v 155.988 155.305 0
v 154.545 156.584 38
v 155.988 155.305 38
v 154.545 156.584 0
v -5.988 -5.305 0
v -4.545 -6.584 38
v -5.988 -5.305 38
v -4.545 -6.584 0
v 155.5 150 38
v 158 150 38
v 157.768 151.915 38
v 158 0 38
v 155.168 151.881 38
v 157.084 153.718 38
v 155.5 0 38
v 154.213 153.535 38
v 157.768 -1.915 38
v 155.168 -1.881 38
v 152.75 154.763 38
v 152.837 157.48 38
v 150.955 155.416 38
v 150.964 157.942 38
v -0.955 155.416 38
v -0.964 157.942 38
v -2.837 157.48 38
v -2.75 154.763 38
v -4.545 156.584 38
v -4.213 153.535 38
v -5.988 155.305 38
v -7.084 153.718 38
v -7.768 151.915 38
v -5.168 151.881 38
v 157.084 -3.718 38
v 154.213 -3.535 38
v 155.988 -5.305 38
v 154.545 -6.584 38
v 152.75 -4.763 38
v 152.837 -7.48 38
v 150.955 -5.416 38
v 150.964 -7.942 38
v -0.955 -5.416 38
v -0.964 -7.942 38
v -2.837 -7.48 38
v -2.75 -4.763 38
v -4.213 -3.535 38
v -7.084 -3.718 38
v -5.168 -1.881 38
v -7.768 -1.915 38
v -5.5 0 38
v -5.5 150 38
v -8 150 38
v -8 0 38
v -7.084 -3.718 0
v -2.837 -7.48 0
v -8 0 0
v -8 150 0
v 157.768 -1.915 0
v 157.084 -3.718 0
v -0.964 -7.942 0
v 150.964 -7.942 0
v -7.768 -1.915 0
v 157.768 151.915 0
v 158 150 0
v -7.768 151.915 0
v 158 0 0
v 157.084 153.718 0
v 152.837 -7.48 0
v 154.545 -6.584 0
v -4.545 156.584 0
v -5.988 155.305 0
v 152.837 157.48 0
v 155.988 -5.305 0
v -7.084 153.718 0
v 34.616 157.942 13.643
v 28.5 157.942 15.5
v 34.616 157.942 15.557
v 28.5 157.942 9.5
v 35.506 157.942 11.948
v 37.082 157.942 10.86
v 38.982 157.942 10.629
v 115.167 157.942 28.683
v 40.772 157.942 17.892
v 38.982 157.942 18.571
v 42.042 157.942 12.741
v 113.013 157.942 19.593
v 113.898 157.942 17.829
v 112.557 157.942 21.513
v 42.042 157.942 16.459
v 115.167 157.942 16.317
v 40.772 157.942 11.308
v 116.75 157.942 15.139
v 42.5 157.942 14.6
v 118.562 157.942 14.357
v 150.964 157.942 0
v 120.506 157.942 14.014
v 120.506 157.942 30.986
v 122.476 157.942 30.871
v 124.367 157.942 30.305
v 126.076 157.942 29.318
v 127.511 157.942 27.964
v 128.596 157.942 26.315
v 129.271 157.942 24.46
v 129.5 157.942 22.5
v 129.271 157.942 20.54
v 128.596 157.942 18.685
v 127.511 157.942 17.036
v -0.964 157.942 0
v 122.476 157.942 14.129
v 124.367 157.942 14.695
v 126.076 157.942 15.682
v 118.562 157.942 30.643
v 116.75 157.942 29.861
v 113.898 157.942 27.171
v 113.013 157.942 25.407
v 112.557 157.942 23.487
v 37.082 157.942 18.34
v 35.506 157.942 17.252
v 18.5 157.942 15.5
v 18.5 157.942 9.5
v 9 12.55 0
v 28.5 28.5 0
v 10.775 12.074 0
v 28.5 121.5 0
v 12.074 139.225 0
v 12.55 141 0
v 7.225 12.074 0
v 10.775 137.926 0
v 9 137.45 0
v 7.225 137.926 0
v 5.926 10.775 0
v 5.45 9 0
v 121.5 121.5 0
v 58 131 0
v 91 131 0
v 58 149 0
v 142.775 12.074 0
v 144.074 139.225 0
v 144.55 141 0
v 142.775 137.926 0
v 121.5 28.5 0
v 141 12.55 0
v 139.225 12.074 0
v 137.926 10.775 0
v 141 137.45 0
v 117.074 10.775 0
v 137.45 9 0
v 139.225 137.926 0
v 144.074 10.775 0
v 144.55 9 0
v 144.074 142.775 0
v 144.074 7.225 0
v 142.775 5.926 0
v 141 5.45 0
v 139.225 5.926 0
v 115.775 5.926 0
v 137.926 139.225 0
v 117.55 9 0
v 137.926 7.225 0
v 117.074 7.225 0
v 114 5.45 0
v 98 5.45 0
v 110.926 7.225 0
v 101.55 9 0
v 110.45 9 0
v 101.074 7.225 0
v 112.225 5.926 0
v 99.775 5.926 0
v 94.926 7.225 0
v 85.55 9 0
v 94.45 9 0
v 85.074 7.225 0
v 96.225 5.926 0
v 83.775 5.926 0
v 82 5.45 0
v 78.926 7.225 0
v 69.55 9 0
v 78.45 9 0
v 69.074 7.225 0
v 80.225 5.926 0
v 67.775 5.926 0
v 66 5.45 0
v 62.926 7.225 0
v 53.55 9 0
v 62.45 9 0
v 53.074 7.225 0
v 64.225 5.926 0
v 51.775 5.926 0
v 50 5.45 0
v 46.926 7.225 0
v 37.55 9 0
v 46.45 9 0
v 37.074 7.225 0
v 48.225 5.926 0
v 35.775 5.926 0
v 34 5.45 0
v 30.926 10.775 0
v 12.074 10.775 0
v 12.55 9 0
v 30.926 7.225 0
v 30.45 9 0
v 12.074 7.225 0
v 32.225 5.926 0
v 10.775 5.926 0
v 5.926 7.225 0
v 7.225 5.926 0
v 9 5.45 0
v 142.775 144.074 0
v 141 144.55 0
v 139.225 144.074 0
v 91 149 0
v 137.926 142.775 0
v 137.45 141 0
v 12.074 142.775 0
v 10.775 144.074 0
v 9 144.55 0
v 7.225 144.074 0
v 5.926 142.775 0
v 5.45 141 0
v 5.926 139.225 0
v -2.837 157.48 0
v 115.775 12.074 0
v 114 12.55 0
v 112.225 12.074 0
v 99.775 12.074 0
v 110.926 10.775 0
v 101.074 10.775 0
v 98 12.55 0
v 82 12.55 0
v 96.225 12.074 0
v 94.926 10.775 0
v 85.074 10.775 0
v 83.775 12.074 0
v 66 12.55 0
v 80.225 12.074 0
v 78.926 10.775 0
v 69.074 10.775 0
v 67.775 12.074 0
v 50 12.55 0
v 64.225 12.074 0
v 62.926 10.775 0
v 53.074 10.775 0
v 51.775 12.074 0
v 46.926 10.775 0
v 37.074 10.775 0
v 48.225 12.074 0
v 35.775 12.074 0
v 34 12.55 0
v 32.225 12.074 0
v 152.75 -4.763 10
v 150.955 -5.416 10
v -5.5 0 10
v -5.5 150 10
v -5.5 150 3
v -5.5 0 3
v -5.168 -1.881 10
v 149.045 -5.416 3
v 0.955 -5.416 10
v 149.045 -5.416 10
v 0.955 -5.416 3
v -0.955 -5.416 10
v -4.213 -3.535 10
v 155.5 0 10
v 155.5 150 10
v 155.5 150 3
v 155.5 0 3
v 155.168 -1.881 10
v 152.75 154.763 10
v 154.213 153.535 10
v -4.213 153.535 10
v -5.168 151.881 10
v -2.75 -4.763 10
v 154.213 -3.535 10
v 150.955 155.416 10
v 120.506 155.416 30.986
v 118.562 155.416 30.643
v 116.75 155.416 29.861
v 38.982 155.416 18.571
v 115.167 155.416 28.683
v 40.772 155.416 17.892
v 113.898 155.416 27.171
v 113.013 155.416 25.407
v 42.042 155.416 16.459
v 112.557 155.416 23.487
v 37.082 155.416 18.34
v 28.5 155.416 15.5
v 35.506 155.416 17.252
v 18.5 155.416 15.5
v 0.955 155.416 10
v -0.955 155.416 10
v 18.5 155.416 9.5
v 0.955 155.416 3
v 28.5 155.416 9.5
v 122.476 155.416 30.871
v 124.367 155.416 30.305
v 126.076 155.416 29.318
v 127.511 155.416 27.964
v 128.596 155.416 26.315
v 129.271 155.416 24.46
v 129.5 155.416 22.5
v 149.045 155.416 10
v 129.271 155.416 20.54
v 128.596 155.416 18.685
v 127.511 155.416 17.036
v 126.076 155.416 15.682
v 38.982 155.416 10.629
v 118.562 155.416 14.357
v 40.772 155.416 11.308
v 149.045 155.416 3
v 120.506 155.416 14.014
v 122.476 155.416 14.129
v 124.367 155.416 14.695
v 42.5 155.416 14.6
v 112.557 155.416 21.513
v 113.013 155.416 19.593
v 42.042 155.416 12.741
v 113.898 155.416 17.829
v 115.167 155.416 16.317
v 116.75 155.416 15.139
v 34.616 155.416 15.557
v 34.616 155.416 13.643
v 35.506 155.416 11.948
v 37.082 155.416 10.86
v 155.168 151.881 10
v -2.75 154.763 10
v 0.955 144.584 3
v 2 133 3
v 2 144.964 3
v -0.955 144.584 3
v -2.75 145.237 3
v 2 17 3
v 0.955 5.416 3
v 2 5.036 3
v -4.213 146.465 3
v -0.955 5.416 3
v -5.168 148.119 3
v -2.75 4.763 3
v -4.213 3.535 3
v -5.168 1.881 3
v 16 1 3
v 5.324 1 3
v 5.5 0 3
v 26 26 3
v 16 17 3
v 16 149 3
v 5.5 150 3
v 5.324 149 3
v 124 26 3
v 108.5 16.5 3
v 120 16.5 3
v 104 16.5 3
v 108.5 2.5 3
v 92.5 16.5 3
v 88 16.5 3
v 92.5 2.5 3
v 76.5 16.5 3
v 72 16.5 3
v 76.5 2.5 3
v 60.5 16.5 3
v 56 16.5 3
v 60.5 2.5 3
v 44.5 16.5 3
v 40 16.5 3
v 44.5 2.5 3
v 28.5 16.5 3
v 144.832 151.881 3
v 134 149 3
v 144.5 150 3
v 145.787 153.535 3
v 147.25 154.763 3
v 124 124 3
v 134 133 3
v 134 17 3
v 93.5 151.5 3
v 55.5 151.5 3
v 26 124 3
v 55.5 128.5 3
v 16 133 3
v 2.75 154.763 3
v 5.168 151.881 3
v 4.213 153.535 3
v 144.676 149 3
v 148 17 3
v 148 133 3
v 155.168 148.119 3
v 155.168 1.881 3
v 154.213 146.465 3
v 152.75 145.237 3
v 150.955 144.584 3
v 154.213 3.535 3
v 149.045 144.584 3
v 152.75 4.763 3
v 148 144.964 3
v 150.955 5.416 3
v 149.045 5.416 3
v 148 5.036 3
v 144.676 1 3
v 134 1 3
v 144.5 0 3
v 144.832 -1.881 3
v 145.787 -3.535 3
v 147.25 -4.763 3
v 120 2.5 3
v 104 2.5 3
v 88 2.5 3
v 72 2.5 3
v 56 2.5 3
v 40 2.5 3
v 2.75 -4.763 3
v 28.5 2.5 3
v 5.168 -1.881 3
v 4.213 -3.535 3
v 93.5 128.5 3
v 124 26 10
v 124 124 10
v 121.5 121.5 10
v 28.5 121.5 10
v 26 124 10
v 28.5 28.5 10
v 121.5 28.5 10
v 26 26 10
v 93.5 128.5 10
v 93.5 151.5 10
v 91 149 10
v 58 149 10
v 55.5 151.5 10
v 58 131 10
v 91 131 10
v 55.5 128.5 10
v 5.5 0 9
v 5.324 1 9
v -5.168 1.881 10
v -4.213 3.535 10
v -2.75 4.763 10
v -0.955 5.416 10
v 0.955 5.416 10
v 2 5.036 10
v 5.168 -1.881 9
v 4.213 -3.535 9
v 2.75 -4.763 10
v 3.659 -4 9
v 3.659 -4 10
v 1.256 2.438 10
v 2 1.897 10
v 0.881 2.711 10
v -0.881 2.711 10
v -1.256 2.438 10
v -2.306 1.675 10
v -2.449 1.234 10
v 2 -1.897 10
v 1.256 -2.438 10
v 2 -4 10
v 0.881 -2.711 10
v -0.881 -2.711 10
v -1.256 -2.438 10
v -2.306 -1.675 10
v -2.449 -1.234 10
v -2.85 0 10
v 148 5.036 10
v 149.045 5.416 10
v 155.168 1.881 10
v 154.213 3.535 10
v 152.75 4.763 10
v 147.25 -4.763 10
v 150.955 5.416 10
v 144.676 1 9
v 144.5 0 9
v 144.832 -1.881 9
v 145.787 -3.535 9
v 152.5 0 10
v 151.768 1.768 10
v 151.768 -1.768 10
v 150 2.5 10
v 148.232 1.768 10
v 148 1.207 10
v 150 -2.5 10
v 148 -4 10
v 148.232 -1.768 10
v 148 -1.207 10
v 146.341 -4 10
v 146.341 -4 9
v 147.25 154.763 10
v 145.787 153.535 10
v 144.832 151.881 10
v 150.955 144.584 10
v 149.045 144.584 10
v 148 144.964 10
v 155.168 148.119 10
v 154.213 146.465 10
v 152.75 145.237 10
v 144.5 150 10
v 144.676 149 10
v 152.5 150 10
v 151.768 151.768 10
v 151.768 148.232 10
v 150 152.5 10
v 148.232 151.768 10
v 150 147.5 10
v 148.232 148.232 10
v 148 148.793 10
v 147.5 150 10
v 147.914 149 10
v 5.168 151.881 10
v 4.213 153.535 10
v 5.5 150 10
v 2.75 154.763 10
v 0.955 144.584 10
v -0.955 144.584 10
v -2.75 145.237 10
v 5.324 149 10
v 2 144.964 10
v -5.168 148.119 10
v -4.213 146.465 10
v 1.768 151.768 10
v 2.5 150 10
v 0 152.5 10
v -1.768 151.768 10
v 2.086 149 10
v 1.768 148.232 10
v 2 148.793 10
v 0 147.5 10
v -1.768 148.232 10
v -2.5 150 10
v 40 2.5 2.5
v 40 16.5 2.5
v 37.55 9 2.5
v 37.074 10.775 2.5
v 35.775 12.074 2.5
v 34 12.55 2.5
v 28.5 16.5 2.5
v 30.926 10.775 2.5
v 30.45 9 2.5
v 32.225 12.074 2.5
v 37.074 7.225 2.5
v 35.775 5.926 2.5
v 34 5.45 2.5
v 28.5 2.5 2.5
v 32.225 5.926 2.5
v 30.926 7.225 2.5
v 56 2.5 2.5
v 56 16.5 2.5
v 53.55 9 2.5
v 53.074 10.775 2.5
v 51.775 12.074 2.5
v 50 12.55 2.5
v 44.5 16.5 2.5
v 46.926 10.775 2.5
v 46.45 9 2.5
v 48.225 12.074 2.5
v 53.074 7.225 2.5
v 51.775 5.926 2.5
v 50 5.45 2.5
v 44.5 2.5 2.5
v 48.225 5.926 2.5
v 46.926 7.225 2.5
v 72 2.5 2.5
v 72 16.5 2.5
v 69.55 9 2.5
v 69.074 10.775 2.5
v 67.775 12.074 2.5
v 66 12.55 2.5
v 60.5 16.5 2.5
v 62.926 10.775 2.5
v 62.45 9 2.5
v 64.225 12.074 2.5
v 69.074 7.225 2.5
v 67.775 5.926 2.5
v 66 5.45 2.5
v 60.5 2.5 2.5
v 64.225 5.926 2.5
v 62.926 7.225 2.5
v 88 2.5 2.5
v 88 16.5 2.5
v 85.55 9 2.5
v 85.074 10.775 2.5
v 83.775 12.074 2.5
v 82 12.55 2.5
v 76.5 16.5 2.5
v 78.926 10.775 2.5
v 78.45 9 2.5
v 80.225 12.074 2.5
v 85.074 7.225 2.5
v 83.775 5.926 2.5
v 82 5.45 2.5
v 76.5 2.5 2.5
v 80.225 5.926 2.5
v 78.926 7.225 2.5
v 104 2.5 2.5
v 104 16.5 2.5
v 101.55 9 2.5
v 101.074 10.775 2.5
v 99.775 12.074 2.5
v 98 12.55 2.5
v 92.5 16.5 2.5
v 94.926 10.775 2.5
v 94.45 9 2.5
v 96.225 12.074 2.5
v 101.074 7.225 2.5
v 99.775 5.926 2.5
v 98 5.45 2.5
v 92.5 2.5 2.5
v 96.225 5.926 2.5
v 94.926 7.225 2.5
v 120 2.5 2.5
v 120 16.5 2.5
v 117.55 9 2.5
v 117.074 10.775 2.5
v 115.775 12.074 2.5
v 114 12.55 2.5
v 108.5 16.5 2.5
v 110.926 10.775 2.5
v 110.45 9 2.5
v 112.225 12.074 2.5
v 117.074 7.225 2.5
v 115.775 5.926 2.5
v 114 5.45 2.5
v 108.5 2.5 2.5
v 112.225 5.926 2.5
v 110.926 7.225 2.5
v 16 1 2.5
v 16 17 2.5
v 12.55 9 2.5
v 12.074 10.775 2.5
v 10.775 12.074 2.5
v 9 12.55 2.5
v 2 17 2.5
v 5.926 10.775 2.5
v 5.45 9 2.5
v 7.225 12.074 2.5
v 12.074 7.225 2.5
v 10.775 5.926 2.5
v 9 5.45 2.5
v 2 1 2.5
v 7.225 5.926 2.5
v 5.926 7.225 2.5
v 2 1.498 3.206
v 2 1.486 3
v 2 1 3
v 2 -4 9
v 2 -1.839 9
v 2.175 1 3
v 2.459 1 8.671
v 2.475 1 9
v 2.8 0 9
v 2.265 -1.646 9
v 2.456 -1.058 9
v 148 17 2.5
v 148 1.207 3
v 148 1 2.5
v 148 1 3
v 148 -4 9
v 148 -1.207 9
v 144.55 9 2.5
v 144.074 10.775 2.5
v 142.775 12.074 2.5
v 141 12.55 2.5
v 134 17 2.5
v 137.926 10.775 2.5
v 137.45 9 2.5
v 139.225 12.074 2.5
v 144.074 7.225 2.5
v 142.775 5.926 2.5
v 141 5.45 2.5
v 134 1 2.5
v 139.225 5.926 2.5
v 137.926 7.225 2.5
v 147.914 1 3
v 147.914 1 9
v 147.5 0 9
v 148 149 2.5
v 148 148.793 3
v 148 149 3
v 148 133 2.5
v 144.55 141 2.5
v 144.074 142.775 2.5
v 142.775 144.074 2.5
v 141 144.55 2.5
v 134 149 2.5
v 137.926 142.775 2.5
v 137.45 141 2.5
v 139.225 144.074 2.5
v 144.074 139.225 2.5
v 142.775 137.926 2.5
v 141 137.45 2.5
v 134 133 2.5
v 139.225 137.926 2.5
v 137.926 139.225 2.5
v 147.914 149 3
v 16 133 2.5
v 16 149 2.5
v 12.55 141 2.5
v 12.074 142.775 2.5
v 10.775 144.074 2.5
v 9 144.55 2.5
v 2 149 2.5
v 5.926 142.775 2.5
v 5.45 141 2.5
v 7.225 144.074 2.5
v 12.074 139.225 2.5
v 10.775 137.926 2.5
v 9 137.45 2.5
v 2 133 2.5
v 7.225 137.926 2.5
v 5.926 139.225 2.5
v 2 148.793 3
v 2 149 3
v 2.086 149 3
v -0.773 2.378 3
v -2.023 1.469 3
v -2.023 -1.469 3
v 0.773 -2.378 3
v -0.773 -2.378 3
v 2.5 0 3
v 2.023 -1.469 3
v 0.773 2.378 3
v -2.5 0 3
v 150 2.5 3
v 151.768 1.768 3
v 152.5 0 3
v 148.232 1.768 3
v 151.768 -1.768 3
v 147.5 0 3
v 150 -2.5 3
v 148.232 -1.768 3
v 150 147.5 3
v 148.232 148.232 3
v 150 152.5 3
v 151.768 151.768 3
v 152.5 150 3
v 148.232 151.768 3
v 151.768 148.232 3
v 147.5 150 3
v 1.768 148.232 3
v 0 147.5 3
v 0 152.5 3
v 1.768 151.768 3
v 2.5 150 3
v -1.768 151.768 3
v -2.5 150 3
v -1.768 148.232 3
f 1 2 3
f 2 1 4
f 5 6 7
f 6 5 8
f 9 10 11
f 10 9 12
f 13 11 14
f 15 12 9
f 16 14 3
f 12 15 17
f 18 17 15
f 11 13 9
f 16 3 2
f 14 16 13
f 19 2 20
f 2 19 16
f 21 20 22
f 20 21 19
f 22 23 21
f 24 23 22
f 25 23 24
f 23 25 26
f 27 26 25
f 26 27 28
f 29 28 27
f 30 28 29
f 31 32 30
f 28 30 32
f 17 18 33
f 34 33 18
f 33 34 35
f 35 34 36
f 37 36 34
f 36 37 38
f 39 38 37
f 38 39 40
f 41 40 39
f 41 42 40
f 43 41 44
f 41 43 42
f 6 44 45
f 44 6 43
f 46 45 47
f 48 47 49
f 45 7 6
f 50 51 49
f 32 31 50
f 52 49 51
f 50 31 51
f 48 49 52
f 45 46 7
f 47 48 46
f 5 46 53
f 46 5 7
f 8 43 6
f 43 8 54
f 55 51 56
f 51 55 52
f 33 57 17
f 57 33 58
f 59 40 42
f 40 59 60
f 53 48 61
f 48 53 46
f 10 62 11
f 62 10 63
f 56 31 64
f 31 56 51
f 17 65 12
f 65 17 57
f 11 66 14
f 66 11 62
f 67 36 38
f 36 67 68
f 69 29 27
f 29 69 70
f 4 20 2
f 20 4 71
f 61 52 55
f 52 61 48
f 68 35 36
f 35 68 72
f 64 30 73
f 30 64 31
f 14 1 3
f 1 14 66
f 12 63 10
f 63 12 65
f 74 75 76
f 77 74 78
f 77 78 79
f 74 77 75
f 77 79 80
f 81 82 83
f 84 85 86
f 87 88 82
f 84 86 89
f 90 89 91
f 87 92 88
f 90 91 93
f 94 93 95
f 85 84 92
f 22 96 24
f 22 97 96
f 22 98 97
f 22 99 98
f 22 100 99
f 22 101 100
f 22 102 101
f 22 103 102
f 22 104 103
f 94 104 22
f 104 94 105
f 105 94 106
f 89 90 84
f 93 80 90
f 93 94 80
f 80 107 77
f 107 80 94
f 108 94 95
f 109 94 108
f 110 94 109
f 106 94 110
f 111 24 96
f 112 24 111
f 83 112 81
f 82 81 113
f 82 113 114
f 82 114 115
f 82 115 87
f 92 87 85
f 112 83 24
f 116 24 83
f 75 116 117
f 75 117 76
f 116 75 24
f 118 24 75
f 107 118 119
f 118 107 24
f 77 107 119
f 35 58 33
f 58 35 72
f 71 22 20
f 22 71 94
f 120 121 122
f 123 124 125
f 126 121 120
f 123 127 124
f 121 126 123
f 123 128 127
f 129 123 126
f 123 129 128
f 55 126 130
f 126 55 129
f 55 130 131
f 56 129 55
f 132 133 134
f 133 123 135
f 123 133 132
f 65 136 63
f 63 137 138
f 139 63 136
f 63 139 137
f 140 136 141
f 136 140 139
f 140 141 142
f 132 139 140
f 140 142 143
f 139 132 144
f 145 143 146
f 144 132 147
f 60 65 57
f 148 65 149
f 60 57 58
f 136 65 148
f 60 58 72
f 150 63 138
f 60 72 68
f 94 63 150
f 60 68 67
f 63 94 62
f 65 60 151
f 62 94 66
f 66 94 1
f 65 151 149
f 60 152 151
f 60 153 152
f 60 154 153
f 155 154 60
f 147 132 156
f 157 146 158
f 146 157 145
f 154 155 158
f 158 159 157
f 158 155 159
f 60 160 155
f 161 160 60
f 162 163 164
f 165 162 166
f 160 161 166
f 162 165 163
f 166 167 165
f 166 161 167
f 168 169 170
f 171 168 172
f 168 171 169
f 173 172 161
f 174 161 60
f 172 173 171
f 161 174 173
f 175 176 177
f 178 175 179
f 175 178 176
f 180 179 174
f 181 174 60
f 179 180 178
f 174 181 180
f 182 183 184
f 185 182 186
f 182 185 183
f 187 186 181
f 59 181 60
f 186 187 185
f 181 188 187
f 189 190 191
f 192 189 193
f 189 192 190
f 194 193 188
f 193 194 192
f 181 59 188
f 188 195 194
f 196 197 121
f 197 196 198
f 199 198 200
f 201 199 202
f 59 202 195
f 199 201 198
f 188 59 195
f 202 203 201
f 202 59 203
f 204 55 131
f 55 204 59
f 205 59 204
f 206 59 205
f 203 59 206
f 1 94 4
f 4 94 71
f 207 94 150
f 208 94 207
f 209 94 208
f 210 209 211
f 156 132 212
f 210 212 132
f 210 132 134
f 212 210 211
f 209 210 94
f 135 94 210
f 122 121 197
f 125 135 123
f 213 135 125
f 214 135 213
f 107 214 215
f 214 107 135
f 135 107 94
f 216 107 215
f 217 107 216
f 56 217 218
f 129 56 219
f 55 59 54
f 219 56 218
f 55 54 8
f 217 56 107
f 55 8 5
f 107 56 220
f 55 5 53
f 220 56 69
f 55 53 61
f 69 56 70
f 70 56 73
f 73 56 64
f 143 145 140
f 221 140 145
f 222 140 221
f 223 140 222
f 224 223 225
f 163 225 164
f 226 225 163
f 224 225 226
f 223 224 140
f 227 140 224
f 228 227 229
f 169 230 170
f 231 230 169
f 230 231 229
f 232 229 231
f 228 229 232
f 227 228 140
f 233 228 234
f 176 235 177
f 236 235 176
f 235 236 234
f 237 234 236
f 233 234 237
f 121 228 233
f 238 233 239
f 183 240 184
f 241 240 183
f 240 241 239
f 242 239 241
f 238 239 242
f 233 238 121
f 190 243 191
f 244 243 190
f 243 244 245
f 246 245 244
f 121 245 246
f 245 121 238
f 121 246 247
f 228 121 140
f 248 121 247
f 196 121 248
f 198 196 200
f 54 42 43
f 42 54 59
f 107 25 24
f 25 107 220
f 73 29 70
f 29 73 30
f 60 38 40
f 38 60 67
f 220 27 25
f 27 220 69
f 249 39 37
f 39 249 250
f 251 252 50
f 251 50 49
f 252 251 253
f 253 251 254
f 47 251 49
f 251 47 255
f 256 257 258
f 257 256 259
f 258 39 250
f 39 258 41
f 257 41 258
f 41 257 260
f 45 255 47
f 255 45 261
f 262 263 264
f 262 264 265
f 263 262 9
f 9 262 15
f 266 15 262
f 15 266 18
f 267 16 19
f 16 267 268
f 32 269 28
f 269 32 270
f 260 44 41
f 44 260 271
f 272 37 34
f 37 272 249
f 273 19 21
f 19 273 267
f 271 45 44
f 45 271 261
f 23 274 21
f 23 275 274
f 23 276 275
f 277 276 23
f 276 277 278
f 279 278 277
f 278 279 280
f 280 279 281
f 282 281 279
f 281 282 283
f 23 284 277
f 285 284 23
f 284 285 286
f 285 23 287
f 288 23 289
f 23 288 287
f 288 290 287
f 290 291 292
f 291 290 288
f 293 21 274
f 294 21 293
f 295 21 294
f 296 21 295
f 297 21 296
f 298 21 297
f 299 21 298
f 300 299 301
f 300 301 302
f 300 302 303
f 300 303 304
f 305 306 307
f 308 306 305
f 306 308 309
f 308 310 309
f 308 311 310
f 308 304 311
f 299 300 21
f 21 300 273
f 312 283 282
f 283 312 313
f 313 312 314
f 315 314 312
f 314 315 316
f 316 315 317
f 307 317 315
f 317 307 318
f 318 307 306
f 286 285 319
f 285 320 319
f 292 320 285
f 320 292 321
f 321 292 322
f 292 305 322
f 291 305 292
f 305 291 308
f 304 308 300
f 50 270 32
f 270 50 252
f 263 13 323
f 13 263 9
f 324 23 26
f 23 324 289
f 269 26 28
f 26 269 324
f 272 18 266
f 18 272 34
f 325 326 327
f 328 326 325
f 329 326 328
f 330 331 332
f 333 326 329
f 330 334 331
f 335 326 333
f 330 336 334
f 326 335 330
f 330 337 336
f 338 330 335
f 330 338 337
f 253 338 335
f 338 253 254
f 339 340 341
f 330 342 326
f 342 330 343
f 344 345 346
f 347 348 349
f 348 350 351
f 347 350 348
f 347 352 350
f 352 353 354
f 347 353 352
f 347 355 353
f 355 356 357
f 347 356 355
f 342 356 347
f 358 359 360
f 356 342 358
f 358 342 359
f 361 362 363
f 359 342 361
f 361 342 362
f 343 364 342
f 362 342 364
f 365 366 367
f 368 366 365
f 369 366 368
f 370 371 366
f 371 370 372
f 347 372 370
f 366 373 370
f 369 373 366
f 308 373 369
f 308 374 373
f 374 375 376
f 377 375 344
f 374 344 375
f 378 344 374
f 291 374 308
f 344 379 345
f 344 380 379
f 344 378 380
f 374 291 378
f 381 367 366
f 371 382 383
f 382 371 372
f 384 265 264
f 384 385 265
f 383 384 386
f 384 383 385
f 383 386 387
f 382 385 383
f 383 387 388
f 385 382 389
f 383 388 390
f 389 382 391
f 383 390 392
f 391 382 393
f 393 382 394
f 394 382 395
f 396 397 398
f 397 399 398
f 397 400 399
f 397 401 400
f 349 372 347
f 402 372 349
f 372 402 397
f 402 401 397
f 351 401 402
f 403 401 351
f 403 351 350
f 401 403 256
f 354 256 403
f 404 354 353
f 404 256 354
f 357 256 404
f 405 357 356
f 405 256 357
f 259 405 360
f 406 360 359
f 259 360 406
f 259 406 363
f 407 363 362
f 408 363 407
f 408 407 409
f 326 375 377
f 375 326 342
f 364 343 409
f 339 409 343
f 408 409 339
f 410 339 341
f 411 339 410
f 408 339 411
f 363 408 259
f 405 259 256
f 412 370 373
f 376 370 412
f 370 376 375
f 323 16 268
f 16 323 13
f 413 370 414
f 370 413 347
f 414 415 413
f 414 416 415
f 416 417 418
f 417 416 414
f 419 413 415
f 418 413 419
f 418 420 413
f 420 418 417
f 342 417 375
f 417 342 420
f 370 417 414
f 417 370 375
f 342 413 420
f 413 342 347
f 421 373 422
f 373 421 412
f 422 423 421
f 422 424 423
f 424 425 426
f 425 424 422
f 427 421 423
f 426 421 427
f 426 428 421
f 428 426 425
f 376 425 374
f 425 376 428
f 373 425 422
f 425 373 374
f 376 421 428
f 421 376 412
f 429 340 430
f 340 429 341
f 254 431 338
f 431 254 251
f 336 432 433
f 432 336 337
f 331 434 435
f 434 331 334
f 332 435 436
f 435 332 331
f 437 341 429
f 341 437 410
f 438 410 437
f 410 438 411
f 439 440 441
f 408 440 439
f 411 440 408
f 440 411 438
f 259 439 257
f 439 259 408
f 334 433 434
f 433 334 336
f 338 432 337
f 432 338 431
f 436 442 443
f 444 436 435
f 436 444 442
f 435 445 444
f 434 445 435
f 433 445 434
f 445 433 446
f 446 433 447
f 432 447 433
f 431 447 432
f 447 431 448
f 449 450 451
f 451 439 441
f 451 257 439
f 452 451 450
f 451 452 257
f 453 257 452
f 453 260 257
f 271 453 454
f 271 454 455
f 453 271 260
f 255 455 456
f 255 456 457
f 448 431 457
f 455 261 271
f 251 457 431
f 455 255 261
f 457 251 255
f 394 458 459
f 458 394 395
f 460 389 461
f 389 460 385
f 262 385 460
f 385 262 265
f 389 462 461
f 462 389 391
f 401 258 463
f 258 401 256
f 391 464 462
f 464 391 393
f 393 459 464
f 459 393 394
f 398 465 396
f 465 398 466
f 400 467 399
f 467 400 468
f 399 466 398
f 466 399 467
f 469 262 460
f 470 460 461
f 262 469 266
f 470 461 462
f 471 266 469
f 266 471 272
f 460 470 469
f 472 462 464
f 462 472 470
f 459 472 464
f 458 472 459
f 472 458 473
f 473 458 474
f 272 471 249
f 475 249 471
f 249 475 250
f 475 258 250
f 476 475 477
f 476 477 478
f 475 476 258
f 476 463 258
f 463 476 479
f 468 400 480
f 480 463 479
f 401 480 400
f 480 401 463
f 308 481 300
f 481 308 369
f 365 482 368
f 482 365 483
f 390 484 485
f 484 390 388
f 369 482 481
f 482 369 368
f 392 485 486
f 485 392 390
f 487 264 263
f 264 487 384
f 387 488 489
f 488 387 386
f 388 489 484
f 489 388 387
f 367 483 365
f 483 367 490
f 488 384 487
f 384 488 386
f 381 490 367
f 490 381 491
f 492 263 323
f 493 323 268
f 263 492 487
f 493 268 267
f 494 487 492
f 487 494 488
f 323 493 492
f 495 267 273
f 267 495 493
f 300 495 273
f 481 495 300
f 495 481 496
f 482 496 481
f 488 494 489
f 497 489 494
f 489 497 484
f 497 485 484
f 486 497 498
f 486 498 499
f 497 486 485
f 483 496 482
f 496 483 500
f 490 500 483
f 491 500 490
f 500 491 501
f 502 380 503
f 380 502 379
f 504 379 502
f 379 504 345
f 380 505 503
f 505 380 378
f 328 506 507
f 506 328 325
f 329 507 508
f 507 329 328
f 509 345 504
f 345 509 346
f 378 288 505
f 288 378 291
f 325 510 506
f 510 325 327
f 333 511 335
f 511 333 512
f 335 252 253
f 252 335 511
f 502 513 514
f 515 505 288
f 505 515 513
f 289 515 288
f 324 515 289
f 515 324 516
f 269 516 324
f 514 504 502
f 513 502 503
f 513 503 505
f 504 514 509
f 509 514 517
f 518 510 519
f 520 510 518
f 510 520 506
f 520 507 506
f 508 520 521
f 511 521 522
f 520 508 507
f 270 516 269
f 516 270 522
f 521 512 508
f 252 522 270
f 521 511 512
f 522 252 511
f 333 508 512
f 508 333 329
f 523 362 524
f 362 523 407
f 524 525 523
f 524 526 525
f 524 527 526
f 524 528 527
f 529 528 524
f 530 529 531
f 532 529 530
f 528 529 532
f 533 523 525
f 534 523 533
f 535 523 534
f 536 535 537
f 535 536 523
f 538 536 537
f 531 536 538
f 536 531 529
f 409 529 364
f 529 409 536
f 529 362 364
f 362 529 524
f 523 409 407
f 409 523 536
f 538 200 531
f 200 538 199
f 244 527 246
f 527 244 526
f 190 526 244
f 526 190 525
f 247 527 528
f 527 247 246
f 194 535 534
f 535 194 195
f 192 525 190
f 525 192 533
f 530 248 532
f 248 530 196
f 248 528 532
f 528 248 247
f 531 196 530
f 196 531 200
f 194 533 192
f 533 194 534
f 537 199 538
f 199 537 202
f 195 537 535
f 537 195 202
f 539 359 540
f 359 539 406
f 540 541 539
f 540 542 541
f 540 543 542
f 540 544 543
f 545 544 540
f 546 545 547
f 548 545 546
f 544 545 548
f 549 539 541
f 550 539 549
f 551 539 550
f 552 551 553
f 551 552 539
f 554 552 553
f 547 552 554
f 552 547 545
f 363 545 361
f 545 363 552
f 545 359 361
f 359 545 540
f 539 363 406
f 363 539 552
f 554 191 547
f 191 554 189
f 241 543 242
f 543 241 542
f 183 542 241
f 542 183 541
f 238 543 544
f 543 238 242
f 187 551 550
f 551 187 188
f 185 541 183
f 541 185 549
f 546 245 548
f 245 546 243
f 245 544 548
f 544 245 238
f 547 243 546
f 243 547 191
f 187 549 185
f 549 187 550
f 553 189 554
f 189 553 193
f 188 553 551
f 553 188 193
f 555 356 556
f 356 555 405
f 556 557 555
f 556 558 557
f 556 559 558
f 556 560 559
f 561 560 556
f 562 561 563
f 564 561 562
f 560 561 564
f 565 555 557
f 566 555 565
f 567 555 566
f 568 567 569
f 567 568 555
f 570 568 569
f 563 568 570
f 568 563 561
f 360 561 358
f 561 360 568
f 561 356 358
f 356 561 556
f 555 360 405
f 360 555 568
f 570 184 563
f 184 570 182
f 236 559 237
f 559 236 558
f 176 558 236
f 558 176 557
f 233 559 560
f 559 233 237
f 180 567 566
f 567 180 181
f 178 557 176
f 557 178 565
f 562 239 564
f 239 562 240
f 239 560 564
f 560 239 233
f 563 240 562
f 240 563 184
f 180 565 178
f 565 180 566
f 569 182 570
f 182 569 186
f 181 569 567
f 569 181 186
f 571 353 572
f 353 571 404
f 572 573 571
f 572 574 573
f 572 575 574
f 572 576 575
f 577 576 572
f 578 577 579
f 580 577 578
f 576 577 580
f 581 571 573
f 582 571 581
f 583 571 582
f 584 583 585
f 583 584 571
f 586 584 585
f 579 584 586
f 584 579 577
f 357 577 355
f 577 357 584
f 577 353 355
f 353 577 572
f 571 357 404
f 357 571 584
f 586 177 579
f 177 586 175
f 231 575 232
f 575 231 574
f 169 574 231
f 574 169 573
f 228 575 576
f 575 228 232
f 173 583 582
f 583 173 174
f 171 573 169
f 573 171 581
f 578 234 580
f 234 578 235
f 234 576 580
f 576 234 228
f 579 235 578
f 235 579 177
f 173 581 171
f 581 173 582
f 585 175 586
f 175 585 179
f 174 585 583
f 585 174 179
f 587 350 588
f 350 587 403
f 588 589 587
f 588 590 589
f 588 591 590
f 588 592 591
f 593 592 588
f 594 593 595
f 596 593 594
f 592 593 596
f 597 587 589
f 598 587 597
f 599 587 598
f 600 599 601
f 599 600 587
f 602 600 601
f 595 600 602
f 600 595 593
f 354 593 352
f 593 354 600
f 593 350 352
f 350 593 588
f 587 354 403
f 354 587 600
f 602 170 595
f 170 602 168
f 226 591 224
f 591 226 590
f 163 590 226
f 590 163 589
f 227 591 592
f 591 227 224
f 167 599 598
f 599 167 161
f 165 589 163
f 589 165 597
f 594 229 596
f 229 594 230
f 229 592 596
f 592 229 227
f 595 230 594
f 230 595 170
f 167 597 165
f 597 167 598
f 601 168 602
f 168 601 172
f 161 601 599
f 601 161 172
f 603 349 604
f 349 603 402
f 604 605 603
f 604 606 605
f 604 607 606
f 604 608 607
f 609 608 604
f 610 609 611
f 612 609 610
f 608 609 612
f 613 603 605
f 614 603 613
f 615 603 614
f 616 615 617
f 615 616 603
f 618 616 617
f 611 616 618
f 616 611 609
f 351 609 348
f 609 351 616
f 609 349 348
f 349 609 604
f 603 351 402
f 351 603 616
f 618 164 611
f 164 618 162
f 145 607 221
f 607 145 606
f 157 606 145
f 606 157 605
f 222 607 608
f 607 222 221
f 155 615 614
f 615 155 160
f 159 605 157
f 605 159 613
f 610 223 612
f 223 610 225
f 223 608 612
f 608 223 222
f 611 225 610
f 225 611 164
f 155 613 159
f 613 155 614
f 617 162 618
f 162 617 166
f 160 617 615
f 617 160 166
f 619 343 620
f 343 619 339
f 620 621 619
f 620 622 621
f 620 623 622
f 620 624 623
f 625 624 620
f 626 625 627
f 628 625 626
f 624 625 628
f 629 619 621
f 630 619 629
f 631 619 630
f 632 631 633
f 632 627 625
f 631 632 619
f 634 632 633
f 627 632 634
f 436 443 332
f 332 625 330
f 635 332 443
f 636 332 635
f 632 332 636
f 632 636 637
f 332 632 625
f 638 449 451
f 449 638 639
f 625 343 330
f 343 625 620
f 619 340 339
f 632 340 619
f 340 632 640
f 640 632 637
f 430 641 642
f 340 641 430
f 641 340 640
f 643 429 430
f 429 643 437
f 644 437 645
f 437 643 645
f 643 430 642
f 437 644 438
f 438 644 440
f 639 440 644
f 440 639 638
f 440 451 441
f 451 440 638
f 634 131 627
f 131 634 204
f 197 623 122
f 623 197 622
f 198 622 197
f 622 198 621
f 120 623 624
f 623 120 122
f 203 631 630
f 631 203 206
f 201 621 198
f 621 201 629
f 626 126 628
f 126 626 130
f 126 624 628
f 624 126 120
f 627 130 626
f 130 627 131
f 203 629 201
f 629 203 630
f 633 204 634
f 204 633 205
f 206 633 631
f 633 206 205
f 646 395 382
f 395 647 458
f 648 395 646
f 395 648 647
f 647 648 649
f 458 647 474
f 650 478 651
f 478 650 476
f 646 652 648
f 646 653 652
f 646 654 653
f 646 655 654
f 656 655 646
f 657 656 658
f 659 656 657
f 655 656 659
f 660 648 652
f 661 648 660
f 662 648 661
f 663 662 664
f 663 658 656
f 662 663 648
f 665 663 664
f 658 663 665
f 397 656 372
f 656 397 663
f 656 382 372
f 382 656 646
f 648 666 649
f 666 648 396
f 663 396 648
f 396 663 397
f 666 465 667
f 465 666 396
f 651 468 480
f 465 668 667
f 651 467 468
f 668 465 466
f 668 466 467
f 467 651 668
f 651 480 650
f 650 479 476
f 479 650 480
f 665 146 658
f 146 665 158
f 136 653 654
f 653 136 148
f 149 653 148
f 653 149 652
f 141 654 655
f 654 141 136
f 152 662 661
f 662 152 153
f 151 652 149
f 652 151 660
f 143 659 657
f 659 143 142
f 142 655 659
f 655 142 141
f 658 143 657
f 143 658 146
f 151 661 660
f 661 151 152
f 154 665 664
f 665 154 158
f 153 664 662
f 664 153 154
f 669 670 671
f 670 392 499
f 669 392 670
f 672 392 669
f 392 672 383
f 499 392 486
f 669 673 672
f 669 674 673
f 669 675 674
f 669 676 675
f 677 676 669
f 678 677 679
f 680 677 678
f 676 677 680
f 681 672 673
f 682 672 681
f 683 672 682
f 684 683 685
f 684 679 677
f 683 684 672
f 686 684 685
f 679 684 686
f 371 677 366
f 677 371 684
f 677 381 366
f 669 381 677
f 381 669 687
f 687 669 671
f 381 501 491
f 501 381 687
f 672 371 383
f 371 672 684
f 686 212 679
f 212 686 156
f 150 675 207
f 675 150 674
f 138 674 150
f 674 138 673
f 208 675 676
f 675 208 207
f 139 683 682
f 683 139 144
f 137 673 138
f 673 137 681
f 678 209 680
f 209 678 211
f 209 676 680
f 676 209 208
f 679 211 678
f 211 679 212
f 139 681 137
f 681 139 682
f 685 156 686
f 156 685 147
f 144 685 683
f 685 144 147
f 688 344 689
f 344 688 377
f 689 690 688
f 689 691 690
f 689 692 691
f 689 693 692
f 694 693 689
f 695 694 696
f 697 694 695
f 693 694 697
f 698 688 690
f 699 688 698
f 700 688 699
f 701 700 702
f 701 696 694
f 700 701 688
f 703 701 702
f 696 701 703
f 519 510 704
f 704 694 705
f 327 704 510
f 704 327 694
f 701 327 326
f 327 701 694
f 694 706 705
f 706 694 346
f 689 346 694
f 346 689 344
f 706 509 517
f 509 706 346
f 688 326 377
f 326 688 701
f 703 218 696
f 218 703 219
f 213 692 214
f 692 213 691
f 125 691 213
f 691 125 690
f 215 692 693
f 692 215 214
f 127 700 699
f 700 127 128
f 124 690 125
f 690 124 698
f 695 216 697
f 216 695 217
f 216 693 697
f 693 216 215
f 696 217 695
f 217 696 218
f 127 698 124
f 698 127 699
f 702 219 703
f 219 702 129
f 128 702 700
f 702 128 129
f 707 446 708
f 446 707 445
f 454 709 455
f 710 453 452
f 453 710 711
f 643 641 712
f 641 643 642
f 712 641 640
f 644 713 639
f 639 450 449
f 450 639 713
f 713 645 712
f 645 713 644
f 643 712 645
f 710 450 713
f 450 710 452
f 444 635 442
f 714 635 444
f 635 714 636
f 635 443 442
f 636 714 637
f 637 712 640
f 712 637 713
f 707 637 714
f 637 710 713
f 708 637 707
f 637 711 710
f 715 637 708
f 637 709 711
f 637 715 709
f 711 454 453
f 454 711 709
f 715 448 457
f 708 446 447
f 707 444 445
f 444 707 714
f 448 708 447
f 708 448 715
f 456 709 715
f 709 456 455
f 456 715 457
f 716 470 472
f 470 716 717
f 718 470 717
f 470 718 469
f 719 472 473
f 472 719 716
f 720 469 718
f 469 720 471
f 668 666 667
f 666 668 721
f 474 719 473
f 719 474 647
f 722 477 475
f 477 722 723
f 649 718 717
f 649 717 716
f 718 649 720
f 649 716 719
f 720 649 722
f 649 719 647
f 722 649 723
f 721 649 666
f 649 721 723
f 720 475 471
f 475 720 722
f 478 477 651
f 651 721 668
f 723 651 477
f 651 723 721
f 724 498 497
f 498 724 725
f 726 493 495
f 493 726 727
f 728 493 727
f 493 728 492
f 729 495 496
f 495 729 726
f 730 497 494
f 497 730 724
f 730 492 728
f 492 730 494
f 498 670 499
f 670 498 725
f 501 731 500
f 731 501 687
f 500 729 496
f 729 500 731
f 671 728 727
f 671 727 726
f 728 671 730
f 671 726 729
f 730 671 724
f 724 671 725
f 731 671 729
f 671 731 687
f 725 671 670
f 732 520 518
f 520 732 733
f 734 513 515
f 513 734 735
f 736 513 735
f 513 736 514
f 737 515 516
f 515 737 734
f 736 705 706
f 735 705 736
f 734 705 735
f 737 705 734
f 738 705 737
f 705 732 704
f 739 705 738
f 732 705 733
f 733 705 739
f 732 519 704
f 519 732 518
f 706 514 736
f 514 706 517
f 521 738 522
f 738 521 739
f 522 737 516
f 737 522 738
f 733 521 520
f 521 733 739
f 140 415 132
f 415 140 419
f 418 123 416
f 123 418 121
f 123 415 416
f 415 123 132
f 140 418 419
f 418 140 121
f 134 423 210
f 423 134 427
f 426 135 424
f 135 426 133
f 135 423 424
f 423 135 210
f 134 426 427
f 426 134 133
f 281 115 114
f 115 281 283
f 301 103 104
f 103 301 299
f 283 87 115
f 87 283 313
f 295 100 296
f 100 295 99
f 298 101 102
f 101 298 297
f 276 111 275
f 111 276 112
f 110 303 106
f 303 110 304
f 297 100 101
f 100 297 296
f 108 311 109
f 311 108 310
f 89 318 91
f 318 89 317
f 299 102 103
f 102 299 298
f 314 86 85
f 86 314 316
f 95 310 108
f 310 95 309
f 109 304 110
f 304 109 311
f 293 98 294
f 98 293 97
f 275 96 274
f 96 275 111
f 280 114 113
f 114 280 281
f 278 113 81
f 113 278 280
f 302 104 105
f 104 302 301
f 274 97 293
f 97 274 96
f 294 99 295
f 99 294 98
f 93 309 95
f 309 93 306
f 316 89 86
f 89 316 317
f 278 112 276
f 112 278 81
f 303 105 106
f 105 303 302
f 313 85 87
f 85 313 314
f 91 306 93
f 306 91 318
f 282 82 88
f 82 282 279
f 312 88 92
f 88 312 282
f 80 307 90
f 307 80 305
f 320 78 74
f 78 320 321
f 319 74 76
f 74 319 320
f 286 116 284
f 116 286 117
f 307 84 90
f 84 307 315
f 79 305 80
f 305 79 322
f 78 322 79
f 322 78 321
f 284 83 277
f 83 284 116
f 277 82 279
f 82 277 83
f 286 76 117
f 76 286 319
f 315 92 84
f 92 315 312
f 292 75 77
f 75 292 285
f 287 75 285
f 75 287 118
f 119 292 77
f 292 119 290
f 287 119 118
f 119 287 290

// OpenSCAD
board_spacing = 150;
face_thickness = 3;
board_offset = 10;
encoder_spacing = 132;
wall_thickness = 3;
board_radius = 5.5;

// 20, 3.5, 15.25


module encoder() {
    mirror([0, 0, 1]) {
        translate([-14 / 2, -16 / 2, -10]) cube([14, 16, 7.5 + 10]);
        translate([-14 / 2, -16 / 2 - 5, -10]) cube([14, 21, 1 + 10]);
        cylinder(35, 3.55, 3.55);
    }
}

module pot() {
    mirror([0, 0, 1]) {
        translate([-11 / 2, -13 / 2, -10]) cube([11.5, 14, 7.5 + 10]);
        cylinder(35, 3.55, 3.55);
    }
}


difference() {
    union() {
            height = 25 + face_thickness + board_offset;
        
            difference() {
            hull () {
                cylinder(height, 5 + wall_thickness, 5 + wall_thickness);
                translate([board_spacing, 0, 0]) cylinder(height, 5 + wall_thickness, 5 + wall_thickness);
                translate([board_spacing, board_spacing, 0]) cylinder(height, 5 + wall_thickness, 5 + wall_thickness);
                translate([0, board_spacing, 0]) cylinder(height, 5 + wall_thickness, 5 + wall_thickness);
            } 

            translate([0, 0, face_thickness])
            hull () {
                cylinder(height, board_radius, board_radius);
                translate([board_spacing, 0, 0]) cylinder(height, board_radius, board_radius);
                translate([board_spacing, board_spacing, 0]) cylinder(height, board_radius, board_radius);
                translate([0, board_spacing, 0]) cylinder(height, board_radius, board_radius);
            }
        }
        
        translate([(board_spacing / 2) - 98 / 2 , (board_spacing / 2) - 98 / 2, 0]) cube([98, 98, board_offset]);
        
        translate([58 - 5 / 2, board_spacing - 1 - 18 - 5 / 2, 0]) cube([33 + 5, 18 + 5, board_offset]);

        cylinder(board_offset, board_radius, board_radius);
        translate([board_spacing, 0, 0]) cylinder(board_offset, board_radius, board_radius);
        translate([board_spacing, board_spacing, 0]) cylinder(board_offset, board_radius, board_radius);
        translate([0, board_spacing, 0]) cylinder(board_offset, board_radius, board_radius);
        
    }

    translate([25 + 9 + 16 * 0, 9, board_offset]) pot();
    translate([25 + 9 + 16 * 1, 9, board_offset]) pot();
    translate([25 + 9 + 16 * 2, 9, board_offset]) pot();
    translate([25 + 9 + 16 * 3, 9, board_offset]) pot();
    translate([25 + 9 + 16 * 4, 9, board_offset]) pot();
    translate([25 + 9 + 16 * 5, 9, board_offset]) pot();
    
    translate([0, 0, 3]) cylinder(10, 2.5, 3);
    translate([board_spacing, 0, 3]) cylinder(10, 2.5, 2.5);
    translate([board_spacing, board_spacing, 3]) cylinder(10, 2.5, 2.5);
    translate([0, board_spacing, 3]) cylinder(10, 2.5, 2.5);

    translate([9, 9, board_offset]) encoder();
    translate([encoder_spacing + 9, 9, board_offset]) encoder();
    translate([encoder_spacing + 9, encoder_spacing + 9, board_offset]) encoder();
    translate([9, encoder_spacing + 9, board_offset]) encoder();
    
    translate([(board_spacing / 2) - 93 / 2 , (board_spacing / 2) - 93 / 2, -1]) cube(93);
            
    translate([58, board_spacing - 1 - 18, -1]) cube([33, 18, 20]);
    
    translate([board_spacing - 29, board_spacing + 10, board_offset + 12.5]) rotate([90, 0, 0]) cylinder(20, 17 / 2, 17 / 2);

    translate([38.5, board_spacing + 10, board_offset + 4.6]) rotate([90, 0, 0]) cylinder(20, 8 / 2, 8 / 2);
    
  translate([23.5, board_spacing + 10, board_offset + 2.5])  cube([10, 40, 6], true);

        
}
